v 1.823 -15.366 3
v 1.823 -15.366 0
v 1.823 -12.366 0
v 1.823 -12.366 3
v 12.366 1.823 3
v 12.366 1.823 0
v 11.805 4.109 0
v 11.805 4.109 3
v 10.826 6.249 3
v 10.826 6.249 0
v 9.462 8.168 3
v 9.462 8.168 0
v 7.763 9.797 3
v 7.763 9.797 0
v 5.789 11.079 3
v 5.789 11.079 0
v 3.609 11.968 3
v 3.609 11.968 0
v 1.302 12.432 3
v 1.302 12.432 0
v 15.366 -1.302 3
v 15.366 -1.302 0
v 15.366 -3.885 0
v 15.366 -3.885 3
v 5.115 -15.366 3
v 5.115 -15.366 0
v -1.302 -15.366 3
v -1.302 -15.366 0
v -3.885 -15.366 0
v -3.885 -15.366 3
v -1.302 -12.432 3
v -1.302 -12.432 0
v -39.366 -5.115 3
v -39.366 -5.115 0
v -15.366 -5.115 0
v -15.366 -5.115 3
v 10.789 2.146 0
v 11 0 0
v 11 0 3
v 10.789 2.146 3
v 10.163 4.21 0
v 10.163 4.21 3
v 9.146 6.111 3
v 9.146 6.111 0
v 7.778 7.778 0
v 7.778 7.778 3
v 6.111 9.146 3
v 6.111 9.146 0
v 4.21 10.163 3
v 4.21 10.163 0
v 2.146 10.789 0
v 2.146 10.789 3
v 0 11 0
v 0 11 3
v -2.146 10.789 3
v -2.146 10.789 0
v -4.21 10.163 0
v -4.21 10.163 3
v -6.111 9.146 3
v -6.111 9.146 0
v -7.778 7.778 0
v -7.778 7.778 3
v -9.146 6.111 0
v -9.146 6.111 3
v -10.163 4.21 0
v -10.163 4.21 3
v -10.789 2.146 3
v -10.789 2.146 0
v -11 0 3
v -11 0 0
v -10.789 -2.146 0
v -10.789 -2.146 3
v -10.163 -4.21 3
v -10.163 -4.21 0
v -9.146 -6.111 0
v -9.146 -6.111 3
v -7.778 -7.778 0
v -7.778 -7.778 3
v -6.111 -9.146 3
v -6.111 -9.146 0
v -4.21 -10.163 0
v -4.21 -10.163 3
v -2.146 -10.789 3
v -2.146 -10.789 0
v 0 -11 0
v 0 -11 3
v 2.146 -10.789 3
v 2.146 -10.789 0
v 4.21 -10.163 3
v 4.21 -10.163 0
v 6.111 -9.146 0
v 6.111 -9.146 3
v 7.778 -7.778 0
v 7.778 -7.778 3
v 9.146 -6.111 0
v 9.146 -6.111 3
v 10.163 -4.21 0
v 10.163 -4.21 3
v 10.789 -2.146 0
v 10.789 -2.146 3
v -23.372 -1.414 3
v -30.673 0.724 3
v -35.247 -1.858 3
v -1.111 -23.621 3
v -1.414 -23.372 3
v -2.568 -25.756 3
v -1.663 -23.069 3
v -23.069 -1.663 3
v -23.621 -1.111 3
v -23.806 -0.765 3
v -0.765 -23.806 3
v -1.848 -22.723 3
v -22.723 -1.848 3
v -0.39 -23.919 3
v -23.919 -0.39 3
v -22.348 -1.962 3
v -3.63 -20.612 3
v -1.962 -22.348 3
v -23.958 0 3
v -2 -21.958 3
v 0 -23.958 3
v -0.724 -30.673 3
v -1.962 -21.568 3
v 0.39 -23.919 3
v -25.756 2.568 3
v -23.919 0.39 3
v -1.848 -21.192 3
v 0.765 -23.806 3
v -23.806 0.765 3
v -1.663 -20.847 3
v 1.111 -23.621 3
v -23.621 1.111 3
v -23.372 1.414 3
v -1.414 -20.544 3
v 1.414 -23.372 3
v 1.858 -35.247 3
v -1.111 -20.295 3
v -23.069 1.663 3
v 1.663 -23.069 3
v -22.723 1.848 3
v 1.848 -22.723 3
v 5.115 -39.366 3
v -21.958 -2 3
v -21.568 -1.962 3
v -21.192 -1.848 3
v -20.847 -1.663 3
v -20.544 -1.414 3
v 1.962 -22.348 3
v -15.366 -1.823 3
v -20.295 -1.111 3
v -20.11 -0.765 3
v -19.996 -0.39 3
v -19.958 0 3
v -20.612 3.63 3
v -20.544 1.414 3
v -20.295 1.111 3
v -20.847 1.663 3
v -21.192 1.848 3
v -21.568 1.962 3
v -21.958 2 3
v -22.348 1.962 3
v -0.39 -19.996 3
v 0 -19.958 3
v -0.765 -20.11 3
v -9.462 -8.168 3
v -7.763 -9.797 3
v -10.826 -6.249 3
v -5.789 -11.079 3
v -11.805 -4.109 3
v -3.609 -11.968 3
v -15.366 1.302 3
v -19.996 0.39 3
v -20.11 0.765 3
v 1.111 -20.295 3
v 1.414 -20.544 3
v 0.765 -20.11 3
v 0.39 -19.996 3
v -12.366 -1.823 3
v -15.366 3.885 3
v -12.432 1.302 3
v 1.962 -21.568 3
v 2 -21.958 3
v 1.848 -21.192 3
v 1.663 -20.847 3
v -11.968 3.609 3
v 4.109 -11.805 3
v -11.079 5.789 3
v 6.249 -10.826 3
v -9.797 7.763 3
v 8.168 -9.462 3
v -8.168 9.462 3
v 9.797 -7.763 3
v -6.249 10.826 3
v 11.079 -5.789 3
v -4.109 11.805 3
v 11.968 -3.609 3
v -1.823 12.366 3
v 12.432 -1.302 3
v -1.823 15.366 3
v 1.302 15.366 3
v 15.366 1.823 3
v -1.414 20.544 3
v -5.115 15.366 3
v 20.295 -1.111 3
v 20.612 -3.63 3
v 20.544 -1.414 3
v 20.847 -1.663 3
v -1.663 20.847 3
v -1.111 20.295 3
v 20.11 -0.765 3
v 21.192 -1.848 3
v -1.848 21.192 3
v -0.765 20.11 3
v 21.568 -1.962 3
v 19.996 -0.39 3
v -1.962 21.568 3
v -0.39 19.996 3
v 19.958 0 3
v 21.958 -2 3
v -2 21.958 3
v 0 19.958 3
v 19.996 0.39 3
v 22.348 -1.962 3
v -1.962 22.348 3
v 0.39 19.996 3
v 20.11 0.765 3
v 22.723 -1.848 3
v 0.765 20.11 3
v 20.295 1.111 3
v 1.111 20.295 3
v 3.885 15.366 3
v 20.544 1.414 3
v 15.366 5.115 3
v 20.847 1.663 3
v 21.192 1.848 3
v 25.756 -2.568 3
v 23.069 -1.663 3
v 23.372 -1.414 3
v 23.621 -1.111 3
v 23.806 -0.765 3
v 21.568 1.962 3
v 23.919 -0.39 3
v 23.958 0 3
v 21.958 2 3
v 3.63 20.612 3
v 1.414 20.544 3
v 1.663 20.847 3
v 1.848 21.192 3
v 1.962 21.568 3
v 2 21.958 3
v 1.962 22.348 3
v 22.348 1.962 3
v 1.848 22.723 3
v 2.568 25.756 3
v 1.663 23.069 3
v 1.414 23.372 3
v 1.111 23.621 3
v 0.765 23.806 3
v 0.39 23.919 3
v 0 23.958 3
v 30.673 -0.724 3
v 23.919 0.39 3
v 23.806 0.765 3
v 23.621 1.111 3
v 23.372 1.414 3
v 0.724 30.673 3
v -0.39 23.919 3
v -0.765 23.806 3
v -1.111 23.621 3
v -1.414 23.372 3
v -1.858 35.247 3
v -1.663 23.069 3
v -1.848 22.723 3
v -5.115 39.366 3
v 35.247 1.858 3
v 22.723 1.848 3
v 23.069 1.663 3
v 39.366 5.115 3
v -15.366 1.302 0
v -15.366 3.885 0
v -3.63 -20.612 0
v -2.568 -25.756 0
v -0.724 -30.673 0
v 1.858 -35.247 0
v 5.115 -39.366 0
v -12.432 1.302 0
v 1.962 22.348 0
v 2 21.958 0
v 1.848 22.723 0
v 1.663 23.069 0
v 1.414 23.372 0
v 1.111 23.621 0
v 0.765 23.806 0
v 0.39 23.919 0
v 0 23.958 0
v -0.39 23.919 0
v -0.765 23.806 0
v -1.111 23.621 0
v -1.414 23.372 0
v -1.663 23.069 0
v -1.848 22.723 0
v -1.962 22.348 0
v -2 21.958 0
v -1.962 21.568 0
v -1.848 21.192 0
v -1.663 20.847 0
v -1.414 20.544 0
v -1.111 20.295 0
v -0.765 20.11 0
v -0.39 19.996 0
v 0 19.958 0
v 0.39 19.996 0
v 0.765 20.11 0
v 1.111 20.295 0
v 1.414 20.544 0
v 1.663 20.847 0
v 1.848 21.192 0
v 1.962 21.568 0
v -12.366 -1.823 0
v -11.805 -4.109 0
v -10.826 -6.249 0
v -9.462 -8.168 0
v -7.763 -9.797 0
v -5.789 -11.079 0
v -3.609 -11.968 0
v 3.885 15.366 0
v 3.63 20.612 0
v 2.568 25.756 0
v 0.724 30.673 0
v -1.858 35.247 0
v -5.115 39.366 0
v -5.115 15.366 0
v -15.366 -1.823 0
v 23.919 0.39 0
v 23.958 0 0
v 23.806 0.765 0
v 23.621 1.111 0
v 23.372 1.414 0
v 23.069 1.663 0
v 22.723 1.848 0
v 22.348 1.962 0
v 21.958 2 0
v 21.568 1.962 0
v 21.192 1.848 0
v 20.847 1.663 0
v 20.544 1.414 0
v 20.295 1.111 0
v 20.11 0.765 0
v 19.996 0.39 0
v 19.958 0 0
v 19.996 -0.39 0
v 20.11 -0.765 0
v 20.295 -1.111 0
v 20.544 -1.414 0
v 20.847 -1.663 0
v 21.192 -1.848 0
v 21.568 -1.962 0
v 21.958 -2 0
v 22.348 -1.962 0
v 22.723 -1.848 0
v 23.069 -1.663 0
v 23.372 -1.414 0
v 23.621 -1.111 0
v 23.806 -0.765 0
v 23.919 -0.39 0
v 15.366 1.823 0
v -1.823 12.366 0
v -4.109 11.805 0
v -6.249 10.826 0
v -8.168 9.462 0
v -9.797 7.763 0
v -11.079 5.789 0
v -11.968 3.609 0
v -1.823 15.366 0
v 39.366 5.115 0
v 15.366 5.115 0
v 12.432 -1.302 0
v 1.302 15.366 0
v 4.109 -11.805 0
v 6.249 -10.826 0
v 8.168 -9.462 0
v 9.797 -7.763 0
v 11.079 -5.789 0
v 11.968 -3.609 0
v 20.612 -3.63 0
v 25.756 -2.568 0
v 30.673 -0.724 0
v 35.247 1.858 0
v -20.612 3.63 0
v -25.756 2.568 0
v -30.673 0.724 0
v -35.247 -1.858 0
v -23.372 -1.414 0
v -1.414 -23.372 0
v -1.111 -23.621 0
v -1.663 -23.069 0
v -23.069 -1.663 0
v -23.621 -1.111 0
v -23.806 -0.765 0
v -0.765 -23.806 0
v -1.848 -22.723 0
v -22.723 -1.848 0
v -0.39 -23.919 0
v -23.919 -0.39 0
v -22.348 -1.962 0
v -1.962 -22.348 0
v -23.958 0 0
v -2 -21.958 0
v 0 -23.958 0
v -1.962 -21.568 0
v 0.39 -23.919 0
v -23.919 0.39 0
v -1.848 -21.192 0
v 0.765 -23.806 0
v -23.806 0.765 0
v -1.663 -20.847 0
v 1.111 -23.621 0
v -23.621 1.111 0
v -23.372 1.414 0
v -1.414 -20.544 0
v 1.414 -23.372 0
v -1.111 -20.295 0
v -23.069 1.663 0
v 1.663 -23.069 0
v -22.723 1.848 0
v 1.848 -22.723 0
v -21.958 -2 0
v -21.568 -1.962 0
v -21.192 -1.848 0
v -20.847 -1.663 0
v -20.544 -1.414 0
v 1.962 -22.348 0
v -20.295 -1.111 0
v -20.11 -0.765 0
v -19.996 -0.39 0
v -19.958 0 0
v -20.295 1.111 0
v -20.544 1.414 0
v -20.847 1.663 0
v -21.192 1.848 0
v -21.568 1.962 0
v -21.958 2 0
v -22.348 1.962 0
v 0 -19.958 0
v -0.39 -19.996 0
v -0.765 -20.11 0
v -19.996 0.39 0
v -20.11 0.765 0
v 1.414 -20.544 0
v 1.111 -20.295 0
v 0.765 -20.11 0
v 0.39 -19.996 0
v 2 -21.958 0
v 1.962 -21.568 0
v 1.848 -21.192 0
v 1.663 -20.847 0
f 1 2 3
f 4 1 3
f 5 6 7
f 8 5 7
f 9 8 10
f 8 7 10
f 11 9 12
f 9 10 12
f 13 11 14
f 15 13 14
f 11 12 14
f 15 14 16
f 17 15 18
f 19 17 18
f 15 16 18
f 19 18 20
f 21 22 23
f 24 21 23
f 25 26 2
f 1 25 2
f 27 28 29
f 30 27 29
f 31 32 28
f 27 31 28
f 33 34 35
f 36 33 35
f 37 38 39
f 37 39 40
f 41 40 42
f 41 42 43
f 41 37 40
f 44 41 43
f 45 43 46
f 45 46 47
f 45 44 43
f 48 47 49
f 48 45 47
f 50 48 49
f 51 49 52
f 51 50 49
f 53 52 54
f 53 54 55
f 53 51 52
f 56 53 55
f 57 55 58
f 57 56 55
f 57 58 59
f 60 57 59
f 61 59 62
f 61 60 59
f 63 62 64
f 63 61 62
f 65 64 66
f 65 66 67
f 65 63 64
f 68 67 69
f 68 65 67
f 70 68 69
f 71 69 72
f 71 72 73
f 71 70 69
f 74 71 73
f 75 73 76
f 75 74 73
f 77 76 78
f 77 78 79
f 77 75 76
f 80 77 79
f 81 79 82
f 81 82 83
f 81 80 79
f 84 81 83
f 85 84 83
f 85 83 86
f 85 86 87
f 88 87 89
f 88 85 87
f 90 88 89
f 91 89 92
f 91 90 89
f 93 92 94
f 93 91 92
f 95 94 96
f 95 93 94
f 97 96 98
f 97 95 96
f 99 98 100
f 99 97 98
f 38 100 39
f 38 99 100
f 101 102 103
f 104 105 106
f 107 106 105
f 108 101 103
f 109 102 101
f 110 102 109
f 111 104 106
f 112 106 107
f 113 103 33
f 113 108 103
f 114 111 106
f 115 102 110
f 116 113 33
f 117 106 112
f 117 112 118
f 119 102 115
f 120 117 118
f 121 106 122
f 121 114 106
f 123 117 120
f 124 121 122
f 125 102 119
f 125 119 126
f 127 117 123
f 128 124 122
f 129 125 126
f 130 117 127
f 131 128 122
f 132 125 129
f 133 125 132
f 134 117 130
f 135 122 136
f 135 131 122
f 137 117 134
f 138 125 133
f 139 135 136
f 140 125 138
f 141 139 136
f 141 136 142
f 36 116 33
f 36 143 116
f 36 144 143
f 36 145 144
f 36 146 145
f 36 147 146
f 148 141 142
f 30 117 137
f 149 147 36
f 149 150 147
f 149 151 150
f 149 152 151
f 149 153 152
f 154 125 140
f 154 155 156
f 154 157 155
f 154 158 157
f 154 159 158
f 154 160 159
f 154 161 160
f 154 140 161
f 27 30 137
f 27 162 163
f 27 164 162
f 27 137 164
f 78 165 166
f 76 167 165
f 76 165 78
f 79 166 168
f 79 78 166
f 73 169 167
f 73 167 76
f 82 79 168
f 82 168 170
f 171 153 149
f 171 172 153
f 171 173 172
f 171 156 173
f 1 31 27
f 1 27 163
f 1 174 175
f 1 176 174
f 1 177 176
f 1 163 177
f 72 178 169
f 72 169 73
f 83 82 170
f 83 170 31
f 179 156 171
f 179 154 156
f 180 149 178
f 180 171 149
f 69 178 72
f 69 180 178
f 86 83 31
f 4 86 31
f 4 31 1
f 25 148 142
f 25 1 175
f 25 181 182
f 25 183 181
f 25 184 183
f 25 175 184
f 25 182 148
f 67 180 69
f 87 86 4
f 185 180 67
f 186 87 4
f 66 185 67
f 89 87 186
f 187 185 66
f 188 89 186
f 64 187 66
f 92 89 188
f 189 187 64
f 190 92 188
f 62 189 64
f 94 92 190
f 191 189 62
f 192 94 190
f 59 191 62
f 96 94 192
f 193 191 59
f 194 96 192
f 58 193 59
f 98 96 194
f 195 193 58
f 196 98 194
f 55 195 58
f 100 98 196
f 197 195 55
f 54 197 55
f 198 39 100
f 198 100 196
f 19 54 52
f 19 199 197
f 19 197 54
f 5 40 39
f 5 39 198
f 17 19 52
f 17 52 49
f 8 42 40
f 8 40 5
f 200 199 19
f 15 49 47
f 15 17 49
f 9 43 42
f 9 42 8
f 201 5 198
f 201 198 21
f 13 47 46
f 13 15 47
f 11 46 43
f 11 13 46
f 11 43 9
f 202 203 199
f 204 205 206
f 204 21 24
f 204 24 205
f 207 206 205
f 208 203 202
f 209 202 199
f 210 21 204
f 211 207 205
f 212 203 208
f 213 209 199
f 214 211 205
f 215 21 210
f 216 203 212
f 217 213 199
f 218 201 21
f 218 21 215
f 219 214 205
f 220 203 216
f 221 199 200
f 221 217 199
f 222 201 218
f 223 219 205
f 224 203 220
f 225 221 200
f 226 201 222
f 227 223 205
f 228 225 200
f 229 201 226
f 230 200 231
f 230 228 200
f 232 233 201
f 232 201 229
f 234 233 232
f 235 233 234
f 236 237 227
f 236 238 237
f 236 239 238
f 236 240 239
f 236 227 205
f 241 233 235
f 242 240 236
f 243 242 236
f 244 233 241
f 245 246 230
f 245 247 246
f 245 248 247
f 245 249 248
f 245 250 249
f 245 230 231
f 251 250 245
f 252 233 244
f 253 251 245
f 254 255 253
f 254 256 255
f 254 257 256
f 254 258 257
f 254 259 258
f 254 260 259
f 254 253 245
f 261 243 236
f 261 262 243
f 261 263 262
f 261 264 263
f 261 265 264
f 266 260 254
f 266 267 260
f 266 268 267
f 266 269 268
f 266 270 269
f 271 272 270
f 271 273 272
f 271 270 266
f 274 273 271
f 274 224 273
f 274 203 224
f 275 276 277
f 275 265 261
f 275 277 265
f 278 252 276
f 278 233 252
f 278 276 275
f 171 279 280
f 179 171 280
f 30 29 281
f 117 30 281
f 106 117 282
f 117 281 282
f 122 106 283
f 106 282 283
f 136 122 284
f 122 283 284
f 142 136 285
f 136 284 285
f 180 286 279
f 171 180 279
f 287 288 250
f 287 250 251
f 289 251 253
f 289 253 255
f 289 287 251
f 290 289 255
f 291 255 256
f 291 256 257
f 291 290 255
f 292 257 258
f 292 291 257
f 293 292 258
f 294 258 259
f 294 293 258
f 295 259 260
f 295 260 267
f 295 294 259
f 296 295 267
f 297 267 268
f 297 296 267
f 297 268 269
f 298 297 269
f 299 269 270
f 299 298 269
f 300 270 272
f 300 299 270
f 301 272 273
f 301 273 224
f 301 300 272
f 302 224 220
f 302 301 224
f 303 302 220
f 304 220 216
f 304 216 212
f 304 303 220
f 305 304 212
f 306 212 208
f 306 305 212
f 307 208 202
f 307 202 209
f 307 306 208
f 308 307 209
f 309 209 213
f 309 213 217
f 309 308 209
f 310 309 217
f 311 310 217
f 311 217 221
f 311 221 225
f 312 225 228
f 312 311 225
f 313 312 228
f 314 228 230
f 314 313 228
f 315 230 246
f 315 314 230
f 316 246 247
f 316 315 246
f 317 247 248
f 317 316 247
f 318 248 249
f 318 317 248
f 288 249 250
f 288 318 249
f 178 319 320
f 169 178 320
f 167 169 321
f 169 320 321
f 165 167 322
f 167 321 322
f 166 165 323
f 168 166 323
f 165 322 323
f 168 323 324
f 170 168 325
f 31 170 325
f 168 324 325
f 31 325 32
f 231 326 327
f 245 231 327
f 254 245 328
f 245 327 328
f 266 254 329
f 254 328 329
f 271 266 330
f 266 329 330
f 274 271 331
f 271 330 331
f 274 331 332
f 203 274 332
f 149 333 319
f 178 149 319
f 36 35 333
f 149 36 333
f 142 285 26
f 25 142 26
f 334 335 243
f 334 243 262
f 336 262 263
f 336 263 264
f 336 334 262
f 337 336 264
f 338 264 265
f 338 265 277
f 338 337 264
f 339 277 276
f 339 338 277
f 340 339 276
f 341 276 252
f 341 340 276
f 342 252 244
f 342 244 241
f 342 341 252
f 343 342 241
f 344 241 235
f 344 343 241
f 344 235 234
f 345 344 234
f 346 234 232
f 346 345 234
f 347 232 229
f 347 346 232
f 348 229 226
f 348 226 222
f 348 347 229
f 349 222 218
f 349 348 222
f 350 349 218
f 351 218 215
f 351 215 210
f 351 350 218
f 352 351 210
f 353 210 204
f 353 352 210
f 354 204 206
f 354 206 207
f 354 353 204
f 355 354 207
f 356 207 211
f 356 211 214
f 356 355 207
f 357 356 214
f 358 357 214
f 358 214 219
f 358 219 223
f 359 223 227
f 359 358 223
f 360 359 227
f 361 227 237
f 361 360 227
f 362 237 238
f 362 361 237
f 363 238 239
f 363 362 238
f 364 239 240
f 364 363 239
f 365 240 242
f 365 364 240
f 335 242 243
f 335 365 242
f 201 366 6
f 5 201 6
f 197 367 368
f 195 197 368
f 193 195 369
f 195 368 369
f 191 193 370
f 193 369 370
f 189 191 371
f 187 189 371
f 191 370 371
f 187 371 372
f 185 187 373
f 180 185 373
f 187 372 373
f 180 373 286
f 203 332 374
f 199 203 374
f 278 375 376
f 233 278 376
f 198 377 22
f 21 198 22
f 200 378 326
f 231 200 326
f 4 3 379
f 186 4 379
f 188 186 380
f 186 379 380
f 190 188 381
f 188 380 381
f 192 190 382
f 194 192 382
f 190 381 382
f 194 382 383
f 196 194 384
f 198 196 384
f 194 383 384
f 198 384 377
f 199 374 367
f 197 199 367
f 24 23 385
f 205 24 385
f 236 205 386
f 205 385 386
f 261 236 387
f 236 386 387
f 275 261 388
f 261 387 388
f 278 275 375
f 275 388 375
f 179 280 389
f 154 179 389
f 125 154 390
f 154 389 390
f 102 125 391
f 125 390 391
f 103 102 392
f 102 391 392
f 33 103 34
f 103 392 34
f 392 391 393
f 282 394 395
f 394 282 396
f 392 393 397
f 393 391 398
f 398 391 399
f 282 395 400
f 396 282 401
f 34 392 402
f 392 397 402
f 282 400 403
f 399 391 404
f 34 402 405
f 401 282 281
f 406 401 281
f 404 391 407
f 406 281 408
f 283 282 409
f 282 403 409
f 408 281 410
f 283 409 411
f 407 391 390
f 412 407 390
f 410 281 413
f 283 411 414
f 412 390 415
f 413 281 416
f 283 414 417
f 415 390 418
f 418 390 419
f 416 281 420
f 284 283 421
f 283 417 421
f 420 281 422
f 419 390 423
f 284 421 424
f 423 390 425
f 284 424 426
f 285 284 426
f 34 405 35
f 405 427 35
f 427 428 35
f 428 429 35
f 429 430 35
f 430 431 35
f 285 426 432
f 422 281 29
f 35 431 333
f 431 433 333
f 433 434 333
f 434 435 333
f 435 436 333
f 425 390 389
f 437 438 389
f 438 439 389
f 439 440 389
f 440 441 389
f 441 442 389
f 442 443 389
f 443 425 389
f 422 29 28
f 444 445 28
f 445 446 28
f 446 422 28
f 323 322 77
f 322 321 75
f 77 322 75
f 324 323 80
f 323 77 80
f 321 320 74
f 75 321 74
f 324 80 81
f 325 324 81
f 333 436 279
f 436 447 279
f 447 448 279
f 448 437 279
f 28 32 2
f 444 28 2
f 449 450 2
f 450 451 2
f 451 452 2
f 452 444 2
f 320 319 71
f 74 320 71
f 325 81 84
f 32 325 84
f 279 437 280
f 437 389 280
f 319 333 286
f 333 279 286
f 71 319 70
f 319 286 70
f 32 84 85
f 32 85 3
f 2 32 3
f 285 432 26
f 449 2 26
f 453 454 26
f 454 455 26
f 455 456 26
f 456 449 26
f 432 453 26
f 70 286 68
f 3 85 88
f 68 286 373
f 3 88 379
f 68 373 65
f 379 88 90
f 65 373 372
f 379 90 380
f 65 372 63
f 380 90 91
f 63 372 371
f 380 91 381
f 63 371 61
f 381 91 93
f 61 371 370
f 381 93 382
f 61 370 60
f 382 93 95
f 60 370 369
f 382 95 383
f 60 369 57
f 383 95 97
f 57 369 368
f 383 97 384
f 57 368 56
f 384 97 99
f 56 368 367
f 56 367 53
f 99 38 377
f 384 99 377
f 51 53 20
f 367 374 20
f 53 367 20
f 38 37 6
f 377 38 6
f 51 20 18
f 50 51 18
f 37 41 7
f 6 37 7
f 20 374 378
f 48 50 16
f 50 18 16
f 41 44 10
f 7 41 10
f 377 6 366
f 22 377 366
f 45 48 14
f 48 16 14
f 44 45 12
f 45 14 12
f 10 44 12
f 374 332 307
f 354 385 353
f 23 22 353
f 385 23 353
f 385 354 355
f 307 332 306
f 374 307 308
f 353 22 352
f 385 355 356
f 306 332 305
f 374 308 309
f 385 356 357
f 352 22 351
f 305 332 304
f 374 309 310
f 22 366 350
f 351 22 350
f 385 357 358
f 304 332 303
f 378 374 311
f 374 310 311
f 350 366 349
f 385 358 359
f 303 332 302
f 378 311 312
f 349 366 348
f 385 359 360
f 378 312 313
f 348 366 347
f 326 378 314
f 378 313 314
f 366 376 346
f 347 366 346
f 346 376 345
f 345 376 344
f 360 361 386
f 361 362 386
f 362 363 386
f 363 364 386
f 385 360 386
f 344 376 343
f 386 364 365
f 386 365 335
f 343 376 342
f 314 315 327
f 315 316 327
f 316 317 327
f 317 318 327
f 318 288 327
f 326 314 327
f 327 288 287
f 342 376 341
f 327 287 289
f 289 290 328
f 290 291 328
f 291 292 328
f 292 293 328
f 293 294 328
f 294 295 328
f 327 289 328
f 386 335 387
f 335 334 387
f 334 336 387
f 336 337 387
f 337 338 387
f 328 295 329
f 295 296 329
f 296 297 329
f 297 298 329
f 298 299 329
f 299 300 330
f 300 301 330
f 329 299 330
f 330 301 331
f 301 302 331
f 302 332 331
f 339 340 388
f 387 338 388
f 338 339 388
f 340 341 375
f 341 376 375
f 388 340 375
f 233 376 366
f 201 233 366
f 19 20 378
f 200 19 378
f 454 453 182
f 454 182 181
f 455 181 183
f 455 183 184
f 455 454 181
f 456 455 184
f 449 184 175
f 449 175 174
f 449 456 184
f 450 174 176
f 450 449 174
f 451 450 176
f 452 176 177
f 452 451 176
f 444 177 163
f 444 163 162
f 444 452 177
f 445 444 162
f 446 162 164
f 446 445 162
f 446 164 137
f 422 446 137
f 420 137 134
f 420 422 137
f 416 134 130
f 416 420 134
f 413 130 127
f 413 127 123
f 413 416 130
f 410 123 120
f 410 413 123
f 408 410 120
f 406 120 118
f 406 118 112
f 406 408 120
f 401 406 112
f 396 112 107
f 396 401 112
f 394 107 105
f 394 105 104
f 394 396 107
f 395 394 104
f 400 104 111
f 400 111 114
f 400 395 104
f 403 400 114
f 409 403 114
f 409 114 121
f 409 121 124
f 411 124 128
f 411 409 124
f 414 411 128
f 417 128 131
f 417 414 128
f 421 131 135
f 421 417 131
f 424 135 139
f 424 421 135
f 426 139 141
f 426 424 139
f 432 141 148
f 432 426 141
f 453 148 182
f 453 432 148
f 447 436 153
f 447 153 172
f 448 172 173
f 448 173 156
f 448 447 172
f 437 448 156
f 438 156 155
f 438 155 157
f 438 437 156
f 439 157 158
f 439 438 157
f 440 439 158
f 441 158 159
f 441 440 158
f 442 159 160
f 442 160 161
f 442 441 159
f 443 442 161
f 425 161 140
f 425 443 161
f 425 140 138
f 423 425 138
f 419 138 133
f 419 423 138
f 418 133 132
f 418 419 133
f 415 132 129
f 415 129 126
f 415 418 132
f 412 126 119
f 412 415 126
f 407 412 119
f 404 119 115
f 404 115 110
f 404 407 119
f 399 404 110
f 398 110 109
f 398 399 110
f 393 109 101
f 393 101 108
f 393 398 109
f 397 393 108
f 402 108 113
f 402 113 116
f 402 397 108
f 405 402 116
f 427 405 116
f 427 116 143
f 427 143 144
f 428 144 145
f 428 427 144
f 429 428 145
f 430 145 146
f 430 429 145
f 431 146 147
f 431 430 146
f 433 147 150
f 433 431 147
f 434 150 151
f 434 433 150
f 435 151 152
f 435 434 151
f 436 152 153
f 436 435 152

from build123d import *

# Parameters (mm, degrees)
F0_R     = 2
F0_R_2   = 11
F1_DEPTH = 3


with BuildPart() as f1:
    # F0 (on Top) → F1 (new body)
    with BuildSketch(Plane.XY):
        with BuildLine():
            Line((-1.822556, 15.366418), (1.301658, 15.366418))
            Line((1.301658, 15.366418), (3.884909, 15.366418))
            ThreePointArc((3.884909, 15.366418), (1.741215, 28.250033), (-5.115091, 39.366418))
            Line((-5.115091, 39.366418), (-5.115091, 15.366418))
            Line((-5.115091, 15.366418), (-1.822556, 15.366418))
        make_face()
        with Locations((0, 21.95785)):
            Circle(F0_R, mode=Mode.SUBTRACT)
        with BuildLine():
            ThreePointArc((-1.822556, 12.366418), (-0.262508, 12.497243), (1.301658, 12.432043))
            Line((1.301658, 12.432043), (1.301658, 15.366418))
            Line((1.301658, 15.366418), (-1.822556, 15.366418))
            Line((-1.822556, 15.366418), (-1.822556, 12.366418))
        make_face()
        with BuildLine():
            ThreePointArc((12.432043, -1.301658), (12.482999, -0.651715), (12.5, 0))
            ThreePointArc((12.5, 0), (12.46656, 0.913722), (12.366418, 1.822556))
            ThreePointArc((12.366418, 1.822556), (8.651264, 9.022507), (1.301658, 12.432043))
            ThreePointArc((1.301658, 12.432043), (-0.262508, 12.497243), (-1.822556, 12.366418))
            ThreePointArc((-1.822556, 12.366418), (-9.022507, 8.651264), (-12.432043, 1.301658))
            ThreePointArc((-12.432043, 1.301658), (-12.497243, -0.262508), (-12.366418, -1.822556))
            ThreePointArc((-12.366418, -1.822556), (-8.651264, -9.022507), (-1.301658, -12.432043))
            ThreePointArc((-1.301658, -12.432043), (0.262508, -12.497243), (1.822556, -12.366418))
            ThreePointArc((1.822556, -12.366418), (9.022507, -8.651264), (12.432043, -1.301658))
        make_face()
        Circle(F0_R_2, mode=Mode.SUBTRACT)
        with BuildLine():
            Line((15.366418, 5.115091), (15.366418, 1.822556))
            Line((15.366418, 1.822556), (15.366418, -1.301658))
            Line((15.366418, -1.301658), (15.366418, -3.884909))
            ThreePointArc((15.366418, -3.884909), (28.250033, -1.741215), (39.366418, 5.115091))
            Line((39.366418, 5.115091), (15.366418, 5.115091))
        make_face()
        with Locations((21.95785, 0)):
            Circle(F0_R, mode=Mode.SUBTRACT)
        with BuildLine():
            Line((1.822556, -15.366418), (1.822556, -12.366418))
            ThreePointArc((1.822556, -12.366418), (0.262508, -12.497243), (-1.301658, -12.432043))
            Line((-1.301658, -12.432043), (-1.301658, -15.366418))
            Line((-1.301658, -15.366418), (1.822556, -15.366418))
        make_face()
        with BuildLine():
            Line((5.115091, -15.366418), (1.822556, -15.366418))
            Line((1.822556, -15.366418), (-1.301658, -15.366418))
            Line((-1.301658, -15.366418), (-3.884909, -15.366418))
            ThreePointArc((-3.884909, -15.366418), (-1.741215, -28.250033), (5.115091, -39.366418))
            Line((5.115091, -39.366418), (5.115091, -15.366418))
        make_face()
        with Locations((0, -21.95785)):
            Circle(F0_R, mode=Mode.SUBTRACT)
        with BuildLine():
            Line((-15.366418, -1.822556), (-15.366418, 1.301658))
            Line((-15.366418, 1.301658), (-15.366418, 3.884909))
            ThreePointArc((-15.366418, 3.884909), (-28.250033, 1.741215), (-39.366418, -5.115091))
            Line((-39.366418, -5.115091), (-15.366418, -5.115091))
            Line((-15.366418, -5.115091), (-15.366418, -1.822556))
        make_face()
        with Locations((-21.95785, 0)):
            Circle(F0_R, mode=Mode.SUBTRACT)
        with BuildLine():
            ThreePointArc((-12.366418, -1.822556), (-12.497243, -0.262508), (-12.432043, 1.301658))
            Line((-12.432043, 1.301658), (-15.366418, 1.301658))
            Line((-15.366418, 1.301658), (-15.366418, -1.822556))
            Line((-15.366418, -1.822556), (-12.366418, -1.822556))
        make_face()
        with BuildLine():
            ThreePointArc((12.366418, 1.822556), (12.46656, 0.913722), (12.5, 0))
            ThreePointArc((12.5, 0), (12.482999, -0.651715), (12.432043, -1.301658))
            Line((12.432043, -1.301658), (15.366418, -1.301658))
            Line((15.366418, -1.301658), (15.366418, 1.822556))
            Line((15.366418, 1.822556), (12.366418, 1.822556))
        make_face()
    extrude(amount=F1_DEPTH)


solid = f1.part
